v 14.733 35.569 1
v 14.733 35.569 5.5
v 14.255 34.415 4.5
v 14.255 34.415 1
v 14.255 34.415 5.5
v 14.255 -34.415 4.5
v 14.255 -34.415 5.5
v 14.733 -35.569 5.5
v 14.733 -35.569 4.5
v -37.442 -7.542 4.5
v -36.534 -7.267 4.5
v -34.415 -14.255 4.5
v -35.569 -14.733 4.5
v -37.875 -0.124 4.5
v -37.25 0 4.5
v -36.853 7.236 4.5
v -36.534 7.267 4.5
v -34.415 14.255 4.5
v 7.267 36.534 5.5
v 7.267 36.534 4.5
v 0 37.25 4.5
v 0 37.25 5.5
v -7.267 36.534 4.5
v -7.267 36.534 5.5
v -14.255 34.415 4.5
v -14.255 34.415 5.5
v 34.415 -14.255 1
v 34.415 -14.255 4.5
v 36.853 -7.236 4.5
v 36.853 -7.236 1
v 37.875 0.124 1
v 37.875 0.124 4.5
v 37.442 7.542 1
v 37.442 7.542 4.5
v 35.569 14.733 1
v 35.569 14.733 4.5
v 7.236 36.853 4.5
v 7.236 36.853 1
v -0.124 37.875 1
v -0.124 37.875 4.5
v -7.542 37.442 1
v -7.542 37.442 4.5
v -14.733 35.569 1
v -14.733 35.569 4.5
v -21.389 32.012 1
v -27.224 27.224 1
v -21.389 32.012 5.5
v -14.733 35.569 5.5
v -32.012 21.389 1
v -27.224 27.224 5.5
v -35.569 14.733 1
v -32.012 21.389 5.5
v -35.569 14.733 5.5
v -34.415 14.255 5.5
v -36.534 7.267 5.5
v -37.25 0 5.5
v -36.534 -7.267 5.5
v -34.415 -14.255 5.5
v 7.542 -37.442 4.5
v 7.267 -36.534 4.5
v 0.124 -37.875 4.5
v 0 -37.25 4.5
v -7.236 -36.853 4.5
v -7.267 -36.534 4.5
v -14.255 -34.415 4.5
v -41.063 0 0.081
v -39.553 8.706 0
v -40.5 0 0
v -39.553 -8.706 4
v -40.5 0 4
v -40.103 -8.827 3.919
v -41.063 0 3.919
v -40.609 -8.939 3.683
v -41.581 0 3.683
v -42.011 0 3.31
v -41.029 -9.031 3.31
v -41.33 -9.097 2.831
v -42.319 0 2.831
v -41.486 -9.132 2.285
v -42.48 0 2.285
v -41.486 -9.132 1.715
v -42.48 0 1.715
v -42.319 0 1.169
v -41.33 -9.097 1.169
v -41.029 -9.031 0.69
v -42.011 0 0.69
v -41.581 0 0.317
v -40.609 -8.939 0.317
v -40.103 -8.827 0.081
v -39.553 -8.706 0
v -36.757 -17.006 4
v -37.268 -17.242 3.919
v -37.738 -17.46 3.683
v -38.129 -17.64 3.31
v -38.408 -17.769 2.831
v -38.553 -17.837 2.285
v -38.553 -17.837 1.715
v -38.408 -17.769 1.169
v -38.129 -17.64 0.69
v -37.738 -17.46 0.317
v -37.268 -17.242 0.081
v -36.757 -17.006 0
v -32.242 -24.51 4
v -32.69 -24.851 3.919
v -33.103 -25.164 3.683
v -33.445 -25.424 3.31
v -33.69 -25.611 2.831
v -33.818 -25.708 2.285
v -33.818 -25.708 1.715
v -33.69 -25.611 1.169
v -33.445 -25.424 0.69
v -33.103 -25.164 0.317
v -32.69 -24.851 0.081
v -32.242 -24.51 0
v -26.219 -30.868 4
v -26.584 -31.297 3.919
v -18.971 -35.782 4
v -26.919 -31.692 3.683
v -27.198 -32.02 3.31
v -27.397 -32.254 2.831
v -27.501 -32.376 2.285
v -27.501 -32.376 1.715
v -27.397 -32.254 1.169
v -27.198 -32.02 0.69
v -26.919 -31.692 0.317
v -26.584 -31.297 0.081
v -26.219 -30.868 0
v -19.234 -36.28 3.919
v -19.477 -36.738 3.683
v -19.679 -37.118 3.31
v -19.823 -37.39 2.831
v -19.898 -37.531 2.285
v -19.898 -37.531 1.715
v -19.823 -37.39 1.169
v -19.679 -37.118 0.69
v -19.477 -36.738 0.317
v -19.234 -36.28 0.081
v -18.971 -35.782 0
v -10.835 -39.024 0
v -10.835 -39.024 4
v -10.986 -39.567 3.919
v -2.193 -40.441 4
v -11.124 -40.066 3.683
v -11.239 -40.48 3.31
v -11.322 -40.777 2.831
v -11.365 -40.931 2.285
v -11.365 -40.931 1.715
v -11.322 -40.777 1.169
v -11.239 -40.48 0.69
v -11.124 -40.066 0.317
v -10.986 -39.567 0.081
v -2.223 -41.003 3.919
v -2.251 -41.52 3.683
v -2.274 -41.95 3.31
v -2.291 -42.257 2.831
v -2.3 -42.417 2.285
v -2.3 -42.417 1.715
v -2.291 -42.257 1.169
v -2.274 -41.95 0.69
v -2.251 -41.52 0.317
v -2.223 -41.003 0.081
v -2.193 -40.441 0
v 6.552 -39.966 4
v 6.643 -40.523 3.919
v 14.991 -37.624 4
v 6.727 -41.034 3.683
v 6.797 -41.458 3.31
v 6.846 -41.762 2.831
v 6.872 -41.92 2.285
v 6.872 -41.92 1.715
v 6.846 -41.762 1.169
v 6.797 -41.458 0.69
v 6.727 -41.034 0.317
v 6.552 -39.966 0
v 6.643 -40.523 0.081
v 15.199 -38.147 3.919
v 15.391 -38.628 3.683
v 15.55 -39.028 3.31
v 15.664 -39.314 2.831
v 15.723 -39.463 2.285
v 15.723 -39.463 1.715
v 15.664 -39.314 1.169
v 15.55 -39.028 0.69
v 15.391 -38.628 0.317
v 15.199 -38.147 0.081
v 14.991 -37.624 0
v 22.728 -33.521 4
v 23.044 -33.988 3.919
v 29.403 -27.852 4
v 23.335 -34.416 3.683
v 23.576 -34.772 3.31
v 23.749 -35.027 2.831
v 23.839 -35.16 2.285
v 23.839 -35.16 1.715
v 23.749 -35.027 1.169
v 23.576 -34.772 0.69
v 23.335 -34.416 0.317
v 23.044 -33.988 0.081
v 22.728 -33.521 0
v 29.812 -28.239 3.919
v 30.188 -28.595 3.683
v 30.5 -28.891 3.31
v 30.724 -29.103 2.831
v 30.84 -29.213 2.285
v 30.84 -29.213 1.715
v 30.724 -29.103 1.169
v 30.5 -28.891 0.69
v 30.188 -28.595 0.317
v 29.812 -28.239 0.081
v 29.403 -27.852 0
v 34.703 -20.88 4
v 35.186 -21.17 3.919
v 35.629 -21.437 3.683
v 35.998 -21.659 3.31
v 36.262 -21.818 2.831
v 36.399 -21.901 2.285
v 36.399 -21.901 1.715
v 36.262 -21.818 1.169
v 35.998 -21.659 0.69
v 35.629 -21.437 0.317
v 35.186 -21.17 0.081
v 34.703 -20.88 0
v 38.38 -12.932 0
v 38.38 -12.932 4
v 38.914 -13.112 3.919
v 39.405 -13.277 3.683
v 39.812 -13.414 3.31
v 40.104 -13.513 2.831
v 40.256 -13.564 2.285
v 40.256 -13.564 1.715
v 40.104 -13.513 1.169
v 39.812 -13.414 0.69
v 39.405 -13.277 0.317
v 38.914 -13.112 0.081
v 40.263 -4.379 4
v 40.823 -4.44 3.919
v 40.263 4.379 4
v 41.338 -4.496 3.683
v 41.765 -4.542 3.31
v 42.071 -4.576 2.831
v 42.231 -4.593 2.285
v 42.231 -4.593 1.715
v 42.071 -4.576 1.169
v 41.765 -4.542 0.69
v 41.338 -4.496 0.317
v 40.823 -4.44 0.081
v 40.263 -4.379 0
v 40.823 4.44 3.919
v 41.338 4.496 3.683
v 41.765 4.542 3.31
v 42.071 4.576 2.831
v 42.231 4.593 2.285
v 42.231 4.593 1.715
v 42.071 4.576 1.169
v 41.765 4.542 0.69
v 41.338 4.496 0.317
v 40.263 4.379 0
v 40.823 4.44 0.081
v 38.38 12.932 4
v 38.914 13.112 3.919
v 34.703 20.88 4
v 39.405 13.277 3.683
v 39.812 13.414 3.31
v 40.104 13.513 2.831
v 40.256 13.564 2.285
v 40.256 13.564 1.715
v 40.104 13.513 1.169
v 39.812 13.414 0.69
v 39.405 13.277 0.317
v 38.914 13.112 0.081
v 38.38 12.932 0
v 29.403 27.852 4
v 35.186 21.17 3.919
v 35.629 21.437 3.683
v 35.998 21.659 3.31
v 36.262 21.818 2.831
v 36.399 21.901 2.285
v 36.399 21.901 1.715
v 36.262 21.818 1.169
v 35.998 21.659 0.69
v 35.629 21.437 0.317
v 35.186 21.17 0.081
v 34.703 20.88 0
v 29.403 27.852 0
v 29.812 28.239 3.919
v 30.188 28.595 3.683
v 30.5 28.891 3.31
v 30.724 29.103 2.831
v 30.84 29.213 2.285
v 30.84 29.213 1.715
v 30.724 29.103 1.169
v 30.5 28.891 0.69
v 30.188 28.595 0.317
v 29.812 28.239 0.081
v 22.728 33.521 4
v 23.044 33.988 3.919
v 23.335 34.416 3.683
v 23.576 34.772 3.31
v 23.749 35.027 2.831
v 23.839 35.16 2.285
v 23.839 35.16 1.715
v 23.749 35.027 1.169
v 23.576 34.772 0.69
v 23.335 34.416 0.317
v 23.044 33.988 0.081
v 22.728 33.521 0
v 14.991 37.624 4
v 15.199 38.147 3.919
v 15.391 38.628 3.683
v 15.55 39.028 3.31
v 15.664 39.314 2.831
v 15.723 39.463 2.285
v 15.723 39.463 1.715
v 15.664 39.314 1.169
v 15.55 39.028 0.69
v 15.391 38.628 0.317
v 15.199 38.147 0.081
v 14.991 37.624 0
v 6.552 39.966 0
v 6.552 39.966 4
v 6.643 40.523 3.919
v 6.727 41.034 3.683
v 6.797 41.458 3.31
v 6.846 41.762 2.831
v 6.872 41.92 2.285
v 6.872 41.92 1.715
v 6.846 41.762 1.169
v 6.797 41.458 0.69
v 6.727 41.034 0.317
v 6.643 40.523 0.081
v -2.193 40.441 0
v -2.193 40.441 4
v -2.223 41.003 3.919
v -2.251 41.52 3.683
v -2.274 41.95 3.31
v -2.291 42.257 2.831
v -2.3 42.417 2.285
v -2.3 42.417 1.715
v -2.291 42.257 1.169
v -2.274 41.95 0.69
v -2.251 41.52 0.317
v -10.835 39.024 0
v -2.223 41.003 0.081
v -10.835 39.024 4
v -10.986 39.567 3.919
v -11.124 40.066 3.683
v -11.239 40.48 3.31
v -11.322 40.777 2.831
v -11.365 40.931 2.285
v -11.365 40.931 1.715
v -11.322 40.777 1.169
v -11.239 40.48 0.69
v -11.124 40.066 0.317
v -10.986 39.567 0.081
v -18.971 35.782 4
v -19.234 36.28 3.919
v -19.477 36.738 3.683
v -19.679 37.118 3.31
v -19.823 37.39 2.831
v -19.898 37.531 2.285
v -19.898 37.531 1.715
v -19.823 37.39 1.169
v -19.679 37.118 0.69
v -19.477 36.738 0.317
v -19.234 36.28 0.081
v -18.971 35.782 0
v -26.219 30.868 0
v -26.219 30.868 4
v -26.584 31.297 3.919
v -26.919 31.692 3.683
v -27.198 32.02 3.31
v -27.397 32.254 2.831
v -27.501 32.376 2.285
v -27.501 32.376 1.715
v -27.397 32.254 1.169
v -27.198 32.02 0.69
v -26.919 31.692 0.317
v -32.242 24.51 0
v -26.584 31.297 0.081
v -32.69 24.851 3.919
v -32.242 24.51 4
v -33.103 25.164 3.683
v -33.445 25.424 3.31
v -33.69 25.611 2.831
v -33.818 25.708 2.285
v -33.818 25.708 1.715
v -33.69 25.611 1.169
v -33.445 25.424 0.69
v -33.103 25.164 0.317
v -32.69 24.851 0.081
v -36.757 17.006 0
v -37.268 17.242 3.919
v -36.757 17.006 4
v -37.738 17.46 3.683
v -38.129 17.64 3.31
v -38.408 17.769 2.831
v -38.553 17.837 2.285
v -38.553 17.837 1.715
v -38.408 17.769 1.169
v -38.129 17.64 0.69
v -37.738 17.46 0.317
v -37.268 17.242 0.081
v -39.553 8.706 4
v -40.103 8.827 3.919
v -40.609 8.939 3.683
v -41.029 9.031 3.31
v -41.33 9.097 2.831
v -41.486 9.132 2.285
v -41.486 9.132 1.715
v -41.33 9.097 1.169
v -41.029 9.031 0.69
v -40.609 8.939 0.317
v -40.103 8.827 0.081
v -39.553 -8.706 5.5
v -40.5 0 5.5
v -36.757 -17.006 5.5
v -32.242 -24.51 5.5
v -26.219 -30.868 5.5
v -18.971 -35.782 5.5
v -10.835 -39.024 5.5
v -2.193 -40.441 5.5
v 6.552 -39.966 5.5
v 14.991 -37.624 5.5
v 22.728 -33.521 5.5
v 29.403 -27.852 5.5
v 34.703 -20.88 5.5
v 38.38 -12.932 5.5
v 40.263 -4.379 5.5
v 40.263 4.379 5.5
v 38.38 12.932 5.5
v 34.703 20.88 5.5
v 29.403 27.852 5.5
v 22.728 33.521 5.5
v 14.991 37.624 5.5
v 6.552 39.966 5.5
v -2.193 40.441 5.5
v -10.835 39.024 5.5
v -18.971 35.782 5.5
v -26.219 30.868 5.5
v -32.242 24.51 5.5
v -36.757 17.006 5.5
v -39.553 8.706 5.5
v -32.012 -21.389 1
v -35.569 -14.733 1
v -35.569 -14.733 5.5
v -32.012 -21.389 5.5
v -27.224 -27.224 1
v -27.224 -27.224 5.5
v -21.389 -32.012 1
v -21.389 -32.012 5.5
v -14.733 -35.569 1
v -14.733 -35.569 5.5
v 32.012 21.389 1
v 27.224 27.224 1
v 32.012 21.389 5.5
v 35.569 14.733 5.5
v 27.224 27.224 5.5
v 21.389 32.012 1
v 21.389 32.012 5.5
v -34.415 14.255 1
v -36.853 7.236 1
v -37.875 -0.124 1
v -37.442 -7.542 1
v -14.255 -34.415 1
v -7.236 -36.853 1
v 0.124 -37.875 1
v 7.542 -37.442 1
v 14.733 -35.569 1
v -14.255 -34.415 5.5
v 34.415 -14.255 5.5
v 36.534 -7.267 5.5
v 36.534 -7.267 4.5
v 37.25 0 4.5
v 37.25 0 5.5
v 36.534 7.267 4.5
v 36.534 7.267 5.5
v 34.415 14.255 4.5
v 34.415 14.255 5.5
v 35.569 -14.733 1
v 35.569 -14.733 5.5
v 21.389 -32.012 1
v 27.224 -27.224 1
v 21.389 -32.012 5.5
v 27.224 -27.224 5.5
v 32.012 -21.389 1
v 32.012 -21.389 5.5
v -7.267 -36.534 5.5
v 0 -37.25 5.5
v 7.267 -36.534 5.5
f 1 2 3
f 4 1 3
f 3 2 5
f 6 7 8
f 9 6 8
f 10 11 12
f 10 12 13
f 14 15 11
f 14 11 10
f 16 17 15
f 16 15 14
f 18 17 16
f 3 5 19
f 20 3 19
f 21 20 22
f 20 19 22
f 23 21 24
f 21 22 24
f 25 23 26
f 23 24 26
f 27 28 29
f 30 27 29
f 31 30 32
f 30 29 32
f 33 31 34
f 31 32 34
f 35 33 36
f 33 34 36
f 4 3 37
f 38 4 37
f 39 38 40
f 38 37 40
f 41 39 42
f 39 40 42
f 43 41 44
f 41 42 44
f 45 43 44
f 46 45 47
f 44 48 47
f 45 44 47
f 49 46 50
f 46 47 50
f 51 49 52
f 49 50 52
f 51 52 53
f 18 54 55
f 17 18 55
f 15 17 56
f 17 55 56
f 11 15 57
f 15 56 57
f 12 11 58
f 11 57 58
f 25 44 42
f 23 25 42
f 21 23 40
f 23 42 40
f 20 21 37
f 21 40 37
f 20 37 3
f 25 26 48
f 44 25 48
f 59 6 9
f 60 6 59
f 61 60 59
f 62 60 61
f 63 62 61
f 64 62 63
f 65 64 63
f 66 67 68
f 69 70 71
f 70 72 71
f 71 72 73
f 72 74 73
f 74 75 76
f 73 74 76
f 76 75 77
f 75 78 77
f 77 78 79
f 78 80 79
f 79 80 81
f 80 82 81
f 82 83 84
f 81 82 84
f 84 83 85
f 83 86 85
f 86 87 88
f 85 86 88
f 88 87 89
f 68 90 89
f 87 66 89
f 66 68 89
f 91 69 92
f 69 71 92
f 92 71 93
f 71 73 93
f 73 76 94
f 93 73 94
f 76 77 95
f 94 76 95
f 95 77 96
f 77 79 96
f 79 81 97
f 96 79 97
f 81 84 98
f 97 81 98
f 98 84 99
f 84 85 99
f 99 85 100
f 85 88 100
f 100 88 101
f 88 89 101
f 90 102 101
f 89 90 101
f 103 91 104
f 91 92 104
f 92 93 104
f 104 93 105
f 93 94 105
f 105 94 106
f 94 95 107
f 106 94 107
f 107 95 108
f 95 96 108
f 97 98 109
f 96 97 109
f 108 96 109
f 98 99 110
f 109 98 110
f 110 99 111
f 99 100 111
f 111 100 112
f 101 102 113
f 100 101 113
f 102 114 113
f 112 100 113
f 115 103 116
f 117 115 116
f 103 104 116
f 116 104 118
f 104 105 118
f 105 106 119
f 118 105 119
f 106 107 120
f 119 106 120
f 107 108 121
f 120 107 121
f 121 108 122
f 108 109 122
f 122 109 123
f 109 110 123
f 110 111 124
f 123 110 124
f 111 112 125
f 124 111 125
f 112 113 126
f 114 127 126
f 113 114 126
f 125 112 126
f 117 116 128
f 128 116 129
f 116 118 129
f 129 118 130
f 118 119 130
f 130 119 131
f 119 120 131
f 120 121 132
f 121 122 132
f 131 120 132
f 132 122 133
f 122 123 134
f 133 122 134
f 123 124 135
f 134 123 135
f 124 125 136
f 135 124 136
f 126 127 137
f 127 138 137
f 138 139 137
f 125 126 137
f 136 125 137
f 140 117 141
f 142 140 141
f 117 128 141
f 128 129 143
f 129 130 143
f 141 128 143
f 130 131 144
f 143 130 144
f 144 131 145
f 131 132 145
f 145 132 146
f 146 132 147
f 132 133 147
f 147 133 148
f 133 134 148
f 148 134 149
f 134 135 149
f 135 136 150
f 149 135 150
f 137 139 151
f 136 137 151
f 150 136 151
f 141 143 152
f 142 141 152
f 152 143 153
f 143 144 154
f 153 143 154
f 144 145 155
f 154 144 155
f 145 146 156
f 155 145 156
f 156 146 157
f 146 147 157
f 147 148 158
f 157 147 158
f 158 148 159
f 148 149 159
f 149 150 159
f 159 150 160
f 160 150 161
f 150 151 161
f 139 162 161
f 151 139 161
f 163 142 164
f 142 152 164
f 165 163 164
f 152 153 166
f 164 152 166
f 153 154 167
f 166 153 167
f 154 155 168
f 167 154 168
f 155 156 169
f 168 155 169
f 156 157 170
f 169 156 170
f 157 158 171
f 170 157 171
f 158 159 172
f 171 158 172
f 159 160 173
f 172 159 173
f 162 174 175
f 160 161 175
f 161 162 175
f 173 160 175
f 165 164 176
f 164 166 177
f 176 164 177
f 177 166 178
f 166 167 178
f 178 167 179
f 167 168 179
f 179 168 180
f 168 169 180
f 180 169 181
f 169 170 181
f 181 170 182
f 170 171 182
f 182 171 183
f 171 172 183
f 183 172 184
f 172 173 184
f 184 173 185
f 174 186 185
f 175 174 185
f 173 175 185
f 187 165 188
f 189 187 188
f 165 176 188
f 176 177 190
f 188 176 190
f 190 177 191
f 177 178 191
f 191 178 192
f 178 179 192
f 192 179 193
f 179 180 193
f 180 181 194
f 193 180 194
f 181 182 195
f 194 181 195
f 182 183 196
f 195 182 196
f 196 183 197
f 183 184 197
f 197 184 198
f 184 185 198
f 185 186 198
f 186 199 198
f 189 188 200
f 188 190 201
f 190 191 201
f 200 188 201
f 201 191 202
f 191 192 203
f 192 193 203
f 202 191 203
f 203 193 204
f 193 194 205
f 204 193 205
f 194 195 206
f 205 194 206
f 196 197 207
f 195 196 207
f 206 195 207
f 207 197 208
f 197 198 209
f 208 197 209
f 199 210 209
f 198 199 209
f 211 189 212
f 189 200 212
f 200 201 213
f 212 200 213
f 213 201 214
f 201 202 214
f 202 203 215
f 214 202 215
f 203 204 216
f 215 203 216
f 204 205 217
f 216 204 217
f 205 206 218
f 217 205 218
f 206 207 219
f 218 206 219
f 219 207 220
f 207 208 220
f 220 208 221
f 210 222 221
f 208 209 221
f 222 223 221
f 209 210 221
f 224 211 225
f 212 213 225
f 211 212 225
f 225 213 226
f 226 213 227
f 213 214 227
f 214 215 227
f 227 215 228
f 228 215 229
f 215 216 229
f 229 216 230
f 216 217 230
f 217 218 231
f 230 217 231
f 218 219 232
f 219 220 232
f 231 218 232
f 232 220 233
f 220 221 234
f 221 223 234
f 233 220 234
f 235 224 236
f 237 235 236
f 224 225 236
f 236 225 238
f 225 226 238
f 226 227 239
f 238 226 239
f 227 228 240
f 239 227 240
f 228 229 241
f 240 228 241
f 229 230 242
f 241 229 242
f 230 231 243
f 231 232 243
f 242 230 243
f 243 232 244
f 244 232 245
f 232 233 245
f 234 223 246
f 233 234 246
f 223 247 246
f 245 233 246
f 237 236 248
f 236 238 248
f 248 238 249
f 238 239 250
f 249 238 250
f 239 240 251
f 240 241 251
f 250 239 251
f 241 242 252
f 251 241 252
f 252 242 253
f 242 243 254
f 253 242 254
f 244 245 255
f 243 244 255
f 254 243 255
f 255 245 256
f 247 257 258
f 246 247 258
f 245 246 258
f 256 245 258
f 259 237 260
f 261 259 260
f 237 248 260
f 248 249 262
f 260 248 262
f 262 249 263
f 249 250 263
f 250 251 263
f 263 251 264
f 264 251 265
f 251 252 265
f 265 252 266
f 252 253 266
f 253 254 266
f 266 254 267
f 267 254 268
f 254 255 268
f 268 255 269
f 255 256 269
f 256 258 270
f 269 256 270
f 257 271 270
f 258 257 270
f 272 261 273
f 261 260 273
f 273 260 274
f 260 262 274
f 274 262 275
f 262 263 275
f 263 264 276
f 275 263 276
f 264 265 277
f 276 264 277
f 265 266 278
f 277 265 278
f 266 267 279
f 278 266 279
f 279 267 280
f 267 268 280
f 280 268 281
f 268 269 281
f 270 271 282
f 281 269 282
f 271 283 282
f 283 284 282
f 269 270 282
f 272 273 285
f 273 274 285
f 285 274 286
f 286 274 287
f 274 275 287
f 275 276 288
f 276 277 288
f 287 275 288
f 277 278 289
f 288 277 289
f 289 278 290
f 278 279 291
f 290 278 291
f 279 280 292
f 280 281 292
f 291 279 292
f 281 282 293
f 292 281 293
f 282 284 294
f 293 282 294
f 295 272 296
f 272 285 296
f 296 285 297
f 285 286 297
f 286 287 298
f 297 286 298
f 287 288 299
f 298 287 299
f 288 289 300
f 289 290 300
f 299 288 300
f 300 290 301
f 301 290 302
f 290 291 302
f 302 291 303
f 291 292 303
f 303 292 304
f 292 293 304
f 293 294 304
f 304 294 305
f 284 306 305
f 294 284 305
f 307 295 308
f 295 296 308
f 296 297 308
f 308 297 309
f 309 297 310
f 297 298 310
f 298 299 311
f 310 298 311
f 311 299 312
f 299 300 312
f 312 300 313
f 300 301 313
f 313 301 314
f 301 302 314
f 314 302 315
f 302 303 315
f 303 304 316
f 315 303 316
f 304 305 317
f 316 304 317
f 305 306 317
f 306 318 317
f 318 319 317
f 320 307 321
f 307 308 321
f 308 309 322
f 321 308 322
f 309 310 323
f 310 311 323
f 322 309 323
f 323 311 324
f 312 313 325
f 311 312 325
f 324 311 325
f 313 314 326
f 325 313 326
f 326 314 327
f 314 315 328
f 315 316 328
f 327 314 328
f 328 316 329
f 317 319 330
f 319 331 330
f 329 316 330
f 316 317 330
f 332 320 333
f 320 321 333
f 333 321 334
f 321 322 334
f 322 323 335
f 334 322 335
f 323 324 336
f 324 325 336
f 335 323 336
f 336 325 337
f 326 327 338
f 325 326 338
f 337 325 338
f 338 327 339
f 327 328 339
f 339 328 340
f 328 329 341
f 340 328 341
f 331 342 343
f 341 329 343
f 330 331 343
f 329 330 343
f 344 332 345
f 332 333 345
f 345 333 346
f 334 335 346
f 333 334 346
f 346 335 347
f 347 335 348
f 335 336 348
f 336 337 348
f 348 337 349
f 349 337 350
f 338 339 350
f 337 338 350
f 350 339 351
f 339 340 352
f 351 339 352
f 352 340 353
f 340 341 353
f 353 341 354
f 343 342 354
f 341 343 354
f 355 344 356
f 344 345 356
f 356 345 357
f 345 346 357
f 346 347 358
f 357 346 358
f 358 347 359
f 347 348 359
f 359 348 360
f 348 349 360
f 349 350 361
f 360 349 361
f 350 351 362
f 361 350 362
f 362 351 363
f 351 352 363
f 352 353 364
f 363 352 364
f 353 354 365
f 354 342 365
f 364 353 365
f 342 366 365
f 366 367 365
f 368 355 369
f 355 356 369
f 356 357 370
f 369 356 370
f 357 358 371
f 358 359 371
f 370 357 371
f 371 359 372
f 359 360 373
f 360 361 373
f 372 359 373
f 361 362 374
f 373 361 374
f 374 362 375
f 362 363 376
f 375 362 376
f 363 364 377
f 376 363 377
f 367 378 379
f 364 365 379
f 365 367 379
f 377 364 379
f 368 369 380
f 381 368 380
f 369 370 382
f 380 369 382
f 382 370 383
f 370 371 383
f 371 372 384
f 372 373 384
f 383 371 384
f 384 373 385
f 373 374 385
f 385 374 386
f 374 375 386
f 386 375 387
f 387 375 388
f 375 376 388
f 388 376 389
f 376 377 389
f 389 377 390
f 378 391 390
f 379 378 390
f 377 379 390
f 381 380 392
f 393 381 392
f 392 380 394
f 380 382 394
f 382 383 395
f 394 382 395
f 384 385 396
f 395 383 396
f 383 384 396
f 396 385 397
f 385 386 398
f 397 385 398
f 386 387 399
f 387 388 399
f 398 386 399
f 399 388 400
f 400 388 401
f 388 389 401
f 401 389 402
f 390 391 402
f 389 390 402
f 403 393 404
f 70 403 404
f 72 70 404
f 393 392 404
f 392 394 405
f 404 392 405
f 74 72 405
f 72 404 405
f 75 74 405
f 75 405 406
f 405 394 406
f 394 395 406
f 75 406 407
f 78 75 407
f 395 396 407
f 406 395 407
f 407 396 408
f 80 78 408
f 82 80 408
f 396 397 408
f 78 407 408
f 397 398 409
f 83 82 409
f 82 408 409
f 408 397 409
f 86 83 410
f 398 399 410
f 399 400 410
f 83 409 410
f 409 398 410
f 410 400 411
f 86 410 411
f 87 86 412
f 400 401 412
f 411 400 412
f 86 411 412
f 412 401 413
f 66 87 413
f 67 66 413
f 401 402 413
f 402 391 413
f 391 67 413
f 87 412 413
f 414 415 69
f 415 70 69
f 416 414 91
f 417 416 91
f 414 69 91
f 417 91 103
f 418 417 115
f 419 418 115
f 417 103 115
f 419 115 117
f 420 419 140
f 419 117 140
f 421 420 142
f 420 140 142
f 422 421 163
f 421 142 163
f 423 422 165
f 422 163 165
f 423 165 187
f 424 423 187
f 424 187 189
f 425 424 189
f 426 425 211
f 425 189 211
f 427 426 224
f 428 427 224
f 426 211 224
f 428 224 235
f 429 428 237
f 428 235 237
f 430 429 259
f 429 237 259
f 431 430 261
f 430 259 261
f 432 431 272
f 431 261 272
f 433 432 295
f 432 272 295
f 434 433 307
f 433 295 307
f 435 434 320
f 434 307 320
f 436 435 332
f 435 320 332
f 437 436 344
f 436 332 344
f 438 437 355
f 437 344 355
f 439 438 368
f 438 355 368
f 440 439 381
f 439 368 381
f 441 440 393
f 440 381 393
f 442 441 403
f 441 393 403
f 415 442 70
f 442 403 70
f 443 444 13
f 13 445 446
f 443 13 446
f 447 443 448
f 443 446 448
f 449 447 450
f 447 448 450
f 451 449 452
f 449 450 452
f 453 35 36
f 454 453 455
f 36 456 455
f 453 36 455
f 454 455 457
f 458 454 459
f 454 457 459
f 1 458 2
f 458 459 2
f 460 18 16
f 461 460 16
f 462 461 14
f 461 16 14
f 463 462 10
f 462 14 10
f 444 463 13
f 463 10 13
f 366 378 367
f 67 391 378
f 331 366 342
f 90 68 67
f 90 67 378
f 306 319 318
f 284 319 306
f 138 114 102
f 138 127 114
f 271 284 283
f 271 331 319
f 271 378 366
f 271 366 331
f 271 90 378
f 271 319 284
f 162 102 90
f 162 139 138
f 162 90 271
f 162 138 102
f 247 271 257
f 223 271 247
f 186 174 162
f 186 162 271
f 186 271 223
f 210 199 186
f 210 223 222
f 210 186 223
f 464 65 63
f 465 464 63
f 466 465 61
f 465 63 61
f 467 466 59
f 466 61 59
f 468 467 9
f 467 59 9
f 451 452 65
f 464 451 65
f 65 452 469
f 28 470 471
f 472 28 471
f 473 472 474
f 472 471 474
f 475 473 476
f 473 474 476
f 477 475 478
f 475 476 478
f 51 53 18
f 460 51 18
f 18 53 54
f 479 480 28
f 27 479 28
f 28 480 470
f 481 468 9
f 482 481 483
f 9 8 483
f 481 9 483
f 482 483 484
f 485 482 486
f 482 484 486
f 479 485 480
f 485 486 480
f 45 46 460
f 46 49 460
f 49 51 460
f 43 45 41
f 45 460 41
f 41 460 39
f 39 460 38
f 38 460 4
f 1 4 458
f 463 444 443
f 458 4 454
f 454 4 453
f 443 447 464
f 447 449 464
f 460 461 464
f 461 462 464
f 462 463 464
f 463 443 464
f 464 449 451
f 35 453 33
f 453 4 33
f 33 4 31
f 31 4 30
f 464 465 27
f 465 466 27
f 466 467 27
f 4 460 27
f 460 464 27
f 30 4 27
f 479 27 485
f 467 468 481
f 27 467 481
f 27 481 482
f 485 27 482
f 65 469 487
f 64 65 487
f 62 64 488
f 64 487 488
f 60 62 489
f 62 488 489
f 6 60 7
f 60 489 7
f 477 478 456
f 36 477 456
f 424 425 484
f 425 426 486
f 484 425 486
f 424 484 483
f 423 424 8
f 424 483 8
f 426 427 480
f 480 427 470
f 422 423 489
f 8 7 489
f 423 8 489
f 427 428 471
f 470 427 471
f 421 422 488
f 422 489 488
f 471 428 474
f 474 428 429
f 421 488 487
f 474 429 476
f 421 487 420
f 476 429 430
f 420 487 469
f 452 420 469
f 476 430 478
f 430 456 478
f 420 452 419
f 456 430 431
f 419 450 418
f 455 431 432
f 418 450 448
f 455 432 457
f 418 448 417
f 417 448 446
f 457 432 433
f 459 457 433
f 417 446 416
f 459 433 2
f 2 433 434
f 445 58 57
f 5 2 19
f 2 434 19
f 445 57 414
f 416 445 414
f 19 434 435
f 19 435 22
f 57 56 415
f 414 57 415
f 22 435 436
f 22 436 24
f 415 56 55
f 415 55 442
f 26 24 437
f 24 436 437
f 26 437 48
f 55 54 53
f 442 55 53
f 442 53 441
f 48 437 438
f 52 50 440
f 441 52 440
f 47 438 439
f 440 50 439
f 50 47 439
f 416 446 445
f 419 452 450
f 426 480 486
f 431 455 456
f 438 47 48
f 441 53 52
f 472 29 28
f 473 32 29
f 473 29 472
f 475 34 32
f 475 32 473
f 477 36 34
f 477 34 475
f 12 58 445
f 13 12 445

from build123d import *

# Parameters (mm, degrees)
PAD001_DEPTH = 1
PAD_DEPTH    = 5.5


with BuildPart() as part:
    # Sketch (on XZ_Plane of Origin) → Revolution (revolve)
    with BuildSketch(Plane.XZ):
        with BuildLine():
            Line((0, 0), (0, 1))
            Line((0, 1), (-38.5, 1))
            Line((-38.5, 1), (-38.5, 5.5))
            Line((-38.5, 5.5), (-40.5, 5.5))
            Line((-40.5, 5.5), (-40.5, 4))
            ThreePointArc((-40.5, 4), (-42.5, 2), (-40.5, 0))
            Line((0, 0), (-40.5, 0))
        make_face()
    revolve(axis=Axis((0, 0, 0), (0, 0, 1)))

    # Sketch001 (on Face3 of Revolution) → Pad001 (new body)
    with BuildSketch(Plane.XY.offset(5.5)):
        with BuildLine():
            ThreePointArc((14.733312, 35.569362), (0, 38.5), (-14.733312, 35.569362))
            Line((-14.254958, 34.414513), (-14.733312, 35.569362))
            ThreePointArc((14.254958, 34.414513), (0, 37.25), (-14.254958, 34.414513))
            Line((14.254958, 34.414513), (14.733312, 35.569362))
        make_face()
        with BuildLine():
            ThreePointArc((34.414513, -14.254958), (37.25, 0), (34.414513, 14.254958))
            Line((34.414513, 14.254958), (35.569362, 14.733312))
            ThreePointArc((35.569362, -14.733312), (38.5, 0), (35.569362, 14.733312))
            Line((34.414513, -14.254958), (35.569362, -14.733312))
        make_face()
        with BuildLine():
            ThreePointArc((-14.254958, -34.414513), (0, -37.25), (14.254958, -34.414513))
            Line((14.254958, -34.414513), (14.733312, -35.569362))
            ThreePointArc((-14.733312, -35.569362), (0, -38.5), (14.733312, -35.569362))
            Line((-14.733312, -35.569362), (-14.254958, -34.414513))
        make_face()
        with BuildLine():
            ThreePointArc((-34.414513, 14.254958), (-37.25, 0), (-34.414513, -14.254958))
            Line((-34.414513, -14.254958), (-35.569362, -14.733312))
            ThreePointArc((-35.569362, 14.733312), (-38.5, 0), (-35.569362, -14.733312))
            Line((-35.569362, 14.733312), (-34.414513, 14.254958))
        make_face()
    extrude(amount=-PAD001_DEPTH)

    # Sketch002 (on Face4 of Pad001) → Pad (join)
    with BuildSketch(Plane.XY.offset(5.5)):
        with BuildLine():
            Line((-35.569362, 14.733312), (-34.414513, 14.254958))
            ThreePointArc((-34.414513, 14.254958), (-37.875, -0.12432), (-35.569362, -14.733312))
            ThreePointArc((-35.569362, 14.733312), (-38.5, 0), (-35.569362, -14.733312))
        make_face()
        with BuildLine():
            ThreePointArc((14.733312, 35.569362), (0, 38.5), (-14.733312, 35.569362))
            ThreePointArc((14.254958, 34.414513), (-0.12432, 37.875), (-14.733312, 35.569362))
            Line((14.733312, 35.569362), (14.254958, 34.414513))
        make_face()
        with BuildLine():
            ThreePointArc((35.569362, -14.733312), (38.5, 0), (35.569362, 14.733312))
            ThreePointArc((34.414513, -14.254958), (37.875, 0.12432), (35.569362, 14.733312))
            Line((35.569362, -14.733312), (34.414513, -14.254958))
        make_face()
        with BuildLine():
            ThreePointArc((-14.733312, -35.569362), (0, -38.5), (14.733312, -35.569362))
            ThreePointArc((-14.254958, -34.414513), (0.12432, -37.875), (14.733312, -35.569362))
            Line((-14.733312, -35.569362), (-14.254958, -34.414513))
        make_face()
    extrude(amount=-PAD_DEPTH)


solid = part.part
